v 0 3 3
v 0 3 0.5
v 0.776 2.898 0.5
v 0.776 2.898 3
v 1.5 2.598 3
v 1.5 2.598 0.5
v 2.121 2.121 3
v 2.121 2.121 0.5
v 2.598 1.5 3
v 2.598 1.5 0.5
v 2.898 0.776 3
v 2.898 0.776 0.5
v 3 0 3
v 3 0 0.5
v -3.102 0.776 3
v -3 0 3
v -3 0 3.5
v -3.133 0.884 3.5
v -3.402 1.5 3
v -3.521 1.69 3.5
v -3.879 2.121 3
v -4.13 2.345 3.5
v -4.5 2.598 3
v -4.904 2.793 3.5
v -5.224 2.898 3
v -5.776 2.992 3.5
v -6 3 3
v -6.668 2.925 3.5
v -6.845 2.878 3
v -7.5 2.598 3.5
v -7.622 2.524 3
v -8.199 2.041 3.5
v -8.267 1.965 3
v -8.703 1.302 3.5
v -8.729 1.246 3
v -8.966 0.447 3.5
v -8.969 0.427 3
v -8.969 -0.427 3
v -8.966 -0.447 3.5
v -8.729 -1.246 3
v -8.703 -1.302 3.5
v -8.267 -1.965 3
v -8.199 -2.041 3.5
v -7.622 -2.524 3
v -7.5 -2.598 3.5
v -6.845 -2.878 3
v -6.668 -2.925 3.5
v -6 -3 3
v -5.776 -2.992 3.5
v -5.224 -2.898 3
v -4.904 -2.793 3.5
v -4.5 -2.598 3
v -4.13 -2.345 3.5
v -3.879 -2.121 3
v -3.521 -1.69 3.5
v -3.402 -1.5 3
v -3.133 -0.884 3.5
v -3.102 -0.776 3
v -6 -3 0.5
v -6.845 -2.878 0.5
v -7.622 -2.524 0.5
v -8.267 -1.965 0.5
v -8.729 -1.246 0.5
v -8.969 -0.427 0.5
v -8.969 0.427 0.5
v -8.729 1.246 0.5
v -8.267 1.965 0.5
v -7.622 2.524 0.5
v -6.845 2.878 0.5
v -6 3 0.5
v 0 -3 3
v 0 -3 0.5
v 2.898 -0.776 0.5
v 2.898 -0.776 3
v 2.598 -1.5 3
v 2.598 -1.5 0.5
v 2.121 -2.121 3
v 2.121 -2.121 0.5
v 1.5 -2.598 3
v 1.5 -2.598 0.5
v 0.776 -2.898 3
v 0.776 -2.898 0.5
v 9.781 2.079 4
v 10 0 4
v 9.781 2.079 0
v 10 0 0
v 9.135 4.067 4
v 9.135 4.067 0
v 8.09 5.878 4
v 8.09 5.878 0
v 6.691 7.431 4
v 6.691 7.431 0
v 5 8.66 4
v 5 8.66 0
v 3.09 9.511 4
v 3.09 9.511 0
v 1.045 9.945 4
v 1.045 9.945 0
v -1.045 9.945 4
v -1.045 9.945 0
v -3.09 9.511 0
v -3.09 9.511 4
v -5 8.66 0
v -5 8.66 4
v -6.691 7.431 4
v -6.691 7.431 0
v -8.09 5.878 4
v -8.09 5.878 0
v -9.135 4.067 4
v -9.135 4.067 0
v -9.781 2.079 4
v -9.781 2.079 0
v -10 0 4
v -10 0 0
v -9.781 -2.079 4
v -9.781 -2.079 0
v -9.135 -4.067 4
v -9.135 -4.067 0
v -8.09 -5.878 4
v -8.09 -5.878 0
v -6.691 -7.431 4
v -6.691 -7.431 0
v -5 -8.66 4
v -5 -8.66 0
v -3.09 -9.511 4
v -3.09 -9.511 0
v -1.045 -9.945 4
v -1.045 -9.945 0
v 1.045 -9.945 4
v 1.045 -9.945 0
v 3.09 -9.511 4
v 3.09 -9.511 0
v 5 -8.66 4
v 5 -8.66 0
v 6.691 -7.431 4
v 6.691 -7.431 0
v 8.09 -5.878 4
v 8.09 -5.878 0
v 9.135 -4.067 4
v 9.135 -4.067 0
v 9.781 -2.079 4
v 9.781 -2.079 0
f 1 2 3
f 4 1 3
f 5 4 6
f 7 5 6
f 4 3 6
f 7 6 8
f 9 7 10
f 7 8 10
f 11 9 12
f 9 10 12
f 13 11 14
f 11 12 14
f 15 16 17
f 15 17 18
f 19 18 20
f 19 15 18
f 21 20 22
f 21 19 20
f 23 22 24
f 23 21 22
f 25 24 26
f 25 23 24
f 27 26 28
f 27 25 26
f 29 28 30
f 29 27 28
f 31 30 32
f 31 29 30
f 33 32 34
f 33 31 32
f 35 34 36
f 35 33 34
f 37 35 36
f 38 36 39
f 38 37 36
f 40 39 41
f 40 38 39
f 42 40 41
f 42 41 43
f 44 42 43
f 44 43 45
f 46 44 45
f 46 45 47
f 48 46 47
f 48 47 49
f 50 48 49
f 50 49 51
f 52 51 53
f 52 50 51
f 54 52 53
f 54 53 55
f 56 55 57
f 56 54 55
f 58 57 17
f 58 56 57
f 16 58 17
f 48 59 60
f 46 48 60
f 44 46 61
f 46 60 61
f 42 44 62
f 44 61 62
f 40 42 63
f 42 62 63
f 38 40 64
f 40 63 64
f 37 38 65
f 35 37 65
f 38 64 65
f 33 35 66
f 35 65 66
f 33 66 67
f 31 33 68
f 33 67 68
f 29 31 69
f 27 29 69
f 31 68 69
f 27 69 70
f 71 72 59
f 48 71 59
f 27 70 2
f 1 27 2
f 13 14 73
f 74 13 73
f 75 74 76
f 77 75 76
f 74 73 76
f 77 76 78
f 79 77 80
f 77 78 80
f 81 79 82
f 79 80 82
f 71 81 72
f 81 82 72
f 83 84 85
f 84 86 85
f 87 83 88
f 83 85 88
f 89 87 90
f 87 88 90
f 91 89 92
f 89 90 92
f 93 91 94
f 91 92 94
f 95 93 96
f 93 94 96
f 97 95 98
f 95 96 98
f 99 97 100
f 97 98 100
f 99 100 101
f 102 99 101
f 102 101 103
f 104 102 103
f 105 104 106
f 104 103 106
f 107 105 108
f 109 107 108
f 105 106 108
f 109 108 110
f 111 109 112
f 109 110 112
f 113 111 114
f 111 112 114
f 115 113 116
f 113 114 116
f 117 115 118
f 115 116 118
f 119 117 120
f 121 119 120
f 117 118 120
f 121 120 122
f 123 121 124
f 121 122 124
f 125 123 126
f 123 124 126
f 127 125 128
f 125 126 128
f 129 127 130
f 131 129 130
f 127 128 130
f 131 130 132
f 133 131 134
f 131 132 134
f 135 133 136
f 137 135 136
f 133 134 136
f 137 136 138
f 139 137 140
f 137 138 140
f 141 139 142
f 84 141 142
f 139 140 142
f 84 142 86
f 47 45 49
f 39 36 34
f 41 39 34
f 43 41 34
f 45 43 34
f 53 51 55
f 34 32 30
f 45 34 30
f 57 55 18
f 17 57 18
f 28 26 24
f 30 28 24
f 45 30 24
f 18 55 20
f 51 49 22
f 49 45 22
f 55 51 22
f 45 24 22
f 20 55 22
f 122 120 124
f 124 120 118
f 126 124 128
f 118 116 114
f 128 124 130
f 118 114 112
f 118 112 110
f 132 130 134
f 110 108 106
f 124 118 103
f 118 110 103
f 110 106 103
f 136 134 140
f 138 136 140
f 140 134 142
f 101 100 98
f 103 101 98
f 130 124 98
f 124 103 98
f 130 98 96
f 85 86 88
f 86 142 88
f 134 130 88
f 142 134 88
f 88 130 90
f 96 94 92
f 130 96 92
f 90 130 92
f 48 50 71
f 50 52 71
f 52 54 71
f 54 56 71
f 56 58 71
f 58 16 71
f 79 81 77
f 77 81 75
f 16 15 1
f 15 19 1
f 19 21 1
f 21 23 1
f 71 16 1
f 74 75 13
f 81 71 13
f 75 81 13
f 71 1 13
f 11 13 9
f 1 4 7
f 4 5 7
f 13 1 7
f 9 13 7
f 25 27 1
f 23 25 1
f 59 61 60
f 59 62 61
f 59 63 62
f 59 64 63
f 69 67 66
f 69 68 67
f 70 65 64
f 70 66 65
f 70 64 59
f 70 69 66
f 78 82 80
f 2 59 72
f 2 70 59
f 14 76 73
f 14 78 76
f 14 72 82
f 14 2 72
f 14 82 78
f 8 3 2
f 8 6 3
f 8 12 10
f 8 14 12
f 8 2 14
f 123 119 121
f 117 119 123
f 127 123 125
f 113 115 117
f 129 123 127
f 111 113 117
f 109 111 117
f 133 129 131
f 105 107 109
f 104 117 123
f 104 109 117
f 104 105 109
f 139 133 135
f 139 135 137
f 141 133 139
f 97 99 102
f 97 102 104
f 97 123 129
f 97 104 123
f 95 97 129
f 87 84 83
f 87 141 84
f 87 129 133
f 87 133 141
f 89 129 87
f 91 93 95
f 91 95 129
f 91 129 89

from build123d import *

# Parameters (mm, degrees)
F0_R     = 10
F1_DEPTH = 0.5
F2_DEPTH = 3
F3_R     = 10
F3_R_2   = 3
F4_DEPTH = 0.5
F5_R     = 10
F6_DEPTH = 0.5


with BuildPart() as f1:
    # F0 (on Top) → F1 (new body)
    with BuildSketch(Plane.XY):
        Circle(F0_R)
        with BuildLine():
            ThreePointArc((0, 3), (2.1213203436, 2.1213203436), (3, 0))
            ThreePointArc((3, 0), (2.1213203436, -2.1213203436), (0, -3))
            Line((0, -3), (-6, -3))
            ThreePointArc((-6, -3), (-9, 0), (-6, 3))
            Line((-6, 3), (0, 3))
        make_face(mode=Mode.SUBTRACT)
        with BuildLine():
            ThreePointArc((-6, -3), (-3.8786796564, -2.1213203436), (-3, 0))
            ThreePointArc((-3, 0), (-3.8786796564, 2.1213203436), (-6, 3))
            ThreePointArc((-6, 3), (-9, 0), (-6, -3))
        make_face()
        with BuildLine():
            ThreePointArc((-3, 0), (-2.1213203436, 2.1213203436), (0, 3))
            Line((0, 3), (-6, 3))
            ThreePointArc((-6, 3), (-3.8786796564, 2.1213203436), (-3, 0))
        make_face()
        with BuildLine():
            Line((-6, -3), (0, -3))
            ThreePointArc((0, -3), (-2.1213203436, -2.1213203436), (-3, 0))
            ThreePointArc((-3, 0), (-3.8786796564, -2.1213203436), (-6, -3))
        make_face()
        with BuildLine():
            ThreePointArc((0, -3), (2.1213203436, -2.1213203436), (3, 0))
            ThreePointArc((3, 0), (2.1213203436, 2.1213203436), (0, 3))
            ThreePointArc((0, 3), (-2.1213203436, 2.1213203436), (-3, 0))
            ThreePointArc((-3, 0), (-2.1213203436, -2.1213203436), (0, -3))
        make_face()
    extrude(amount=F1_DEPTH)

    # F0 (on Top) → F2 (join)
    with BuildSketch(Plane.XY):
        Circle(F0_R)
        with BuildLine():
            ThreePointArc((0, 3), (2.1213203436, 2.1213203436), (3, 0))
            ThreePointArc((3, 0), (2.1213203436, -2.1213203436), (0, -3))
            Line((0, -3), (-6, -3))
            ThreePointArc((-6, -3), (-9, 0), (-6, 3))
            Line((-6, 3), (0, 3))
        make_face(mode=Mode.SUBTRACT)
    extrude(amount=F2_DEPTH)

    # F3 (on face) → F4 (join)
    with BuildSketch(Plane.XY.offset(3)):
        Circle(F3_R)
        with Locations((-6, 0)):
            Circle(F3_R_2, mode=Mode.SUBTRACT)
    extrude(amount=F4_DEPTH)

    # F5 (on face) → F6 (join)
    with BuildSketch(Plane.XY.offset(3.5)):
        Circle(F5_R)
    extrude(amount=F6_DEPTH)


solid = f1.part
